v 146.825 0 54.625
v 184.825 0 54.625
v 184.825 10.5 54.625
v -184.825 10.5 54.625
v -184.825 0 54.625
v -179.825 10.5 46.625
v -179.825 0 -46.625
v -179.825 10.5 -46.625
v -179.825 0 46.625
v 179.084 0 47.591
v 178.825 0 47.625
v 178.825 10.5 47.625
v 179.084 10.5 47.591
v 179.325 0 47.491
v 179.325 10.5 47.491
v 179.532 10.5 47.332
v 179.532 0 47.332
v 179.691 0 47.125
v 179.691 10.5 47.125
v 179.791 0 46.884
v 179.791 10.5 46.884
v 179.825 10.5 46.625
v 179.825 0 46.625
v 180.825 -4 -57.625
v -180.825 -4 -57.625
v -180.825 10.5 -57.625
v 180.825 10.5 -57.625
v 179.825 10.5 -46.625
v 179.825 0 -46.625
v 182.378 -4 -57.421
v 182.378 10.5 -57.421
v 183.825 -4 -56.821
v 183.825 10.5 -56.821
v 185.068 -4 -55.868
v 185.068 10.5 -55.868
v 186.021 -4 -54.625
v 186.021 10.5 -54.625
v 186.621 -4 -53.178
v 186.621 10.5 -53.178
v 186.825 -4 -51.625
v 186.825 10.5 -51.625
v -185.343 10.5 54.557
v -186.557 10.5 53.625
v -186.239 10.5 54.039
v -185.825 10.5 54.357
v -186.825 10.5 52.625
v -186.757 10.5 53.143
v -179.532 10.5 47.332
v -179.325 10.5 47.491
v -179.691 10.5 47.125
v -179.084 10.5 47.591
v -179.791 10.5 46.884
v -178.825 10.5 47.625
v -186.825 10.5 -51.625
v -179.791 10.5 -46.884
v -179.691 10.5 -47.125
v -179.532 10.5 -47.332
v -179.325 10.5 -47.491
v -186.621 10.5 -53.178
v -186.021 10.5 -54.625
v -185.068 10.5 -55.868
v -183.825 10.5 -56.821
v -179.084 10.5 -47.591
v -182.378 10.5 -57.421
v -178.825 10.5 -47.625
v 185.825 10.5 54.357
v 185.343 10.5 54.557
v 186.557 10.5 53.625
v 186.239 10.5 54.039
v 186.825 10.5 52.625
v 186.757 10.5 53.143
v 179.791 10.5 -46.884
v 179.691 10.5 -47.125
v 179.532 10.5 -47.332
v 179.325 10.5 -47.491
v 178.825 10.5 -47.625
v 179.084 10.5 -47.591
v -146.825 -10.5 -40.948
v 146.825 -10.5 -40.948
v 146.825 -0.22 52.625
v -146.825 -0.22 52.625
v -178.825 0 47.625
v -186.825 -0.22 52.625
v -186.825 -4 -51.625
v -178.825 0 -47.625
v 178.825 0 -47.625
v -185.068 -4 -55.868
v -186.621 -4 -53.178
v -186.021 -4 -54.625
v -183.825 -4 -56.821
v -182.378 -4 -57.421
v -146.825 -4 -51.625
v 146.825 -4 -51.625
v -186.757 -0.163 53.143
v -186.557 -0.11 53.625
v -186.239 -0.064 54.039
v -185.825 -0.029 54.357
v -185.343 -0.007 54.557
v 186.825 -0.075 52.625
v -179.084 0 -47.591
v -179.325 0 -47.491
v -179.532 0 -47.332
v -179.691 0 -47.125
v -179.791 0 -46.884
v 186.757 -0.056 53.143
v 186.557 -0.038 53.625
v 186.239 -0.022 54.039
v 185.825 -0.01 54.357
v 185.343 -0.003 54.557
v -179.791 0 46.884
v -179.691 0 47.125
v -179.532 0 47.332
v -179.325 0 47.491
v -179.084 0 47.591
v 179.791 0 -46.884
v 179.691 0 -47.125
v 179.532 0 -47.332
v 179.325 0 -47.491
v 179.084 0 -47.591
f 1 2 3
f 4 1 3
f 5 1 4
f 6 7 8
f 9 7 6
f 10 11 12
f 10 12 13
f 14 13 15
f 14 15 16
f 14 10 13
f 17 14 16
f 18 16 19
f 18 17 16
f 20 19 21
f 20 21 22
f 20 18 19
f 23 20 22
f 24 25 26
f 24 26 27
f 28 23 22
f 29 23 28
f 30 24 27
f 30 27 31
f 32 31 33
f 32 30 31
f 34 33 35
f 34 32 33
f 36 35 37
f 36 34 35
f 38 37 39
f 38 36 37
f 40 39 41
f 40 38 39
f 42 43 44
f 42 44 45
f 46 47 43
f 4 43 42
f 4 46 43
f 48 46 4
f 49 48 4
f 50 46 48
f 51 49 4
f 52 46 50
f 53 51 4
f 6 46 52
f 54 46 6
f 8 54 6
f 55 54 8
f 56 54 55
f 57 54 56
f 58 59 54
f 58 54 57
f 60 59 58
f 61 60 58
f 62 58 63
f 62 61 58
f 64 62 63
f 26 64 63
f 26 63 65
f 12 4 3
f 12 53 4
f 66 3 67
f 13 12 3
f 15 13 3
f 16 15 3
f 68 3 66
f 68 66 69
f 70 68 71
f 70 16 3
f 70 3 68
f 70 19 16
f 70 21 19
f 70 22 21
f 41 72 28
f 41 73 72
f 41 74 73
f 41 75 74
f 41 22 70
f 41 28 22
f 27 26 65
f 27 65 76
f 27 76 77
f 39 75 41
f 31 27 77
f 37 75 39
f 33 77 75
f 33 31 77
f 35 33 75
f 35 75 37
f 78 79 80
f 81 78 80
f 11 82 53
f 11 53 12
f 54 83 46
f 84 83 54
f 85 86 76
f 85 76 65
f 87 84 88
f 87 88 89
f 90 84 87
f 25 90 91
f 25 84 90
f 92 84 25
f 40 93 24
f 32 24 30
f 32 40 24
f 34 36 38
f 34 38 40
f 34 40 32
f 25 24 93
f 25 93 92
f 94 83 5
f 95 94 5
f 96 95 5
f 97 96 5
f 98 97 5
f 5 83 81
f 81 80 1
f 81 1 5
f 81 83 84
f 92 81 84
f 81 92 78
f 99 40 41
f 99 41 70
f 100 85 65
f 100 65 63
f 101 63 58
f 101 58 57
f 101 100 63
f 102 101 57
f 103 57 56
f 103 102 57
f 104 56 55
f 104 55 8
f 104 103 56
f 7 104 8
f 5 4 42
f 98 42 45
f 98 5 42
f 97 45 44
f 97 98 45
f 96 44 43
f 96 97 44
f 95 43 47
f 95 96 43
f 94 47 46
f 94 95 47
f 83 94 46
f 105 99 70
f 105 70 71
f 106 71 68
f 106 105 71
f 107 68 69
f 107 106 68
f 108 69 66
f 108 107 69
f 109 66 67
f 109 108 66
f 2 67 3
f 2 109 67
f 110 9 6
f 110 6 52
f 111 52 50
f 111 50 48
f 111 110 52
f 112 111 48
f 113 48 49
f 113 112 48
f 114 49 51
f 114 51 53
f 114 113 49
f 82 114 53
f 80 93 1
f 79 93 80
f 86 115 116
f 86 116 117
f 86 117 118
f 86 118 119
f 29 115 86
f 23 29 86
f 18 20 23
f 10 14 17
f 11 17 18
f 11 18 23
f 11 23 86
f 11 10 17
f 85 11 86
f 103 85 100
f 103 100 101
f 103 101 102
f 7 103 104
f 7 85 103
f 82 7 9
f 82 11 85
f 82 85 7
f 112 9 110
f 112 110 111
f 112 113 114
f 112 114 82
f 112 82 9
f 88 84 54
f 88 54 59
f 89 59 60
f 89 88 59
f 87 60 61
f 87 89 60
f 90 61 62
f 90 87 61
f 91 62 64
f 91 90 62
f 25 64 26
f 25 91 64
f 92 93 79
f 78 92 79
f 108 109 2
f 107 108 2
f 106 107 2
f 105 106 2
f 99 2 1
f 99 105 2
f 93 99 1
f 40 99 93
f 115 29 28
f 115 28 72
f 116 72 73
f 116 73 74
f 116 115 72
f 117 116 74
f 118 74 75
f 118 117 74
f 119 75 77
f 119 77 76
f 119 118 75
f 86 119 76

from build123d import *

# Parameters (mm, degrees)
BOSS_EXTRUDE1_DEPTH = 10.5
BOSS_EXTRUDE3_START = 10.5
BOSS_EXTRUDE3_DEPTH = 10.5
SKETCH5_W           = 6
SKETCH5_H           = 6.5
CUT_EXTRUDE1_DEPTH  = 400
CUT_EXTRUDE2_DEPTH  = 40
CUT_EXTRUDE3_DEPTH  = 40


with BuildPart() as part:
    # Sketch2 → Boss-Extrude1 (new body)
    with BuildSketch(Plane(origin=(0, 0, 0), x_dir=(1, 0, 0), z_dir=(0, 1, 0))):
        with BuildLine():
            Line((-186.825, 51.625), (-186.825, -52.625))
            ThreePointArc((-186.825, -52.625), (-186.239213562, -54.039213562), (-184.825, -54.625))
            Line((-184.825, -54.625), (184.825, -54.625))
            ThreePointArc((184.825, -54.625), (186.239213562, -54.039213562), (186.825, -52.625))
            Line((186.825, -52.625), (186.825, 51.625))
            ThreePointArc((186.825, 51.625), (185.067640687, 55.867640687), (180.825, 57.625))
            Line((180.825, 57.625), (-180.825, 57.625))
            ThreePointArc((-180.825, 57.625), (-185.067640687, 55.867640687), (-186.825, 51.625))
        make_face()
        with BuildLine():
            ThreePointArc((-178.825, 47.625), (-179.532106781, 47.332106781), (-179.825, 46.625))
            Line((-179.825, 46.625), (-179.825, -46.625))
            ThreePointArc((-179.825, -46.625), (-179.532106781, -47.332106781), (-178.825, -47.625))
            Line((-178.825, -47.625), (178.825, -47.625))
            ThreePointArc((178.825, -47.625), (179.532106781, -47.332106781), (179.825, -46.625))
            Line((179.825, -46.625), (179.825, 46.625))
            ThreePointArc((179.825, 46.625), (179.532106781, 47.332106781), (178.825, 47.625))
            Line((178.825, 47.625), (-178.825, 47.625))
        make_face(mode=Mode.SUBTRACT)
    extrude(amount=BOSS_EXTRUDE1_DEPTH)

    # Sketch4 → Boss-Extrude3 (add)
    # profile 1 of 2: a face of its own
    with BuildSketch(Plane.XZ.offset(BOSS_EXTRUDE3_START)):
        with BuildLine():
            ThreePointArc((-184.825, 54.625), (-186.239213562, 54.039213562), (-186.825, 52.625))
            Line((-186.825, 52.625), (-186.825, -51.625))
            ThreePointArc((-186.825, -51.625), (-185.067640687, -55.867640687), (-180.825, -57.625))
            Line((-180.825, -57.625), (180.825, -57.625))
            ThreePointArc((180.825, -57.625), (185.067640687, -55.867640687), (186.825, -51.625))
            Line((186.825, -51.625), (186.825, 52.625))
            ThreePointArc((186.825, 52.625), (186.239213562, 54.039213562), (184.825, 54.625))
            Line((184.825, 54.625), (-184.825, 54.625))
        make_face()
        with BuildLine():
            Line((178.825, -47.625), (-178.825, -47.625))
            ThreePointArc((-178.825, -47.625), (-179.532106781, -47.332106781), (-179.825, -46.625))
            Line((-179.825, -46.625), (-179.825, 46.625))
            ThreePointArc((-179.825, 46.625), (-179.532106781, 47.332106781), (-178.825, 47.625))
            Line((-178.825, 47.625), (178.825, 47.625))
            ThreePointArc((178.825, 47.625), (179.532106781, 47.332106781), (179.825, 46.625))
            Line((179.825, 46.625), (179.825, -46.625))
            ThreePointArc((179.825, -46.625), (179.532106781, -47.332106781), (178.825, -47.625))
        make_face(mode=Mode.SUBTRACT)
    # profile 2 of 2: a face of its own
    with BuildSketch(Plane.XZ.offset(BOSS_EXTRUDE3_START)):
        with BuildLine():
            ThreePointArc((-178.825, -47.625), (-179.532106781, -47.332106781), (-179.825, -46.625))
            Line((-179.825, -46.625), (-179.825, 46.625))
            ThreePointArc((-179.825, 46.625), (-179.532106781, 47.332106781), (-178.825, 47.625))
            Line((-178.825, 47.625), (178.825, 47.625))
            ThreePointArc((178.825, 47.625), (179.532106781, 47.332106781), (179.825, 46.625))
            Line((179.825, 46.625), (179.825, -46.625))
            ThreePointArc((179.825, -46.625), (179.532106781, -47.332106781), (178.825, -47.625))
            Line((178.825, -47.625), (-178.825, -47.625))
        make_face()
    extrude(amount=-BOSS_EXTRUDE3_DEPTH)

    # Sketch5 → Cut-Extrude1 (cut)
    with BuildSketch(Plane(origin=(186.825, 0, 0), x_dir=(0, 0, -1), z_dir=(1, 0, 0))):
        Polygon((-52.625, -10.5), (-52.625, -0.219727509), (-54.625, 0), (-54.625, -10.5), align=None)
        Polygon((-52.625, -10.5), (40.947921748, -10.5), (-52.625, -0.219727509), align=None)
        Polygon((51.625, -10.5), (51.625, -4), (40.947921748, -10.5), align=None)
        with Locations((54.625, -7.25)):
            Rectangle(SKETCH5_W, SKETCH5_H)
    extrude(amount=-CUT_EXTRUDE1_DEPTH, mode=Mode.SUBTRACT)

    # Sketch6 → Cut-Extrude2 (cut)
    with BuildSketch(Plane(origin=(186.825, 0, 0), x_dir=(0, 0, -1), z_dir=(1, 0, 0))):
        Polygon((-54.625, 0), (51.625, -4), (40.947921748, -10.5), align=None)
    extrude(amount=-CUT_EXTRUDE2_DEPTH, mode=Mode.SUBTRACT)

    # Sketch7 → Cut-Extrude3 (cut)
    with BuildSketch(Plane.ZY.offset(186.825)):
        Polygon((-51.625, -4), (-40.947921748, -10.5), (52.625, -0.219727509), align=None)
    extrude(amount=-CUT_EXTRUDE3_DEPTH, mode=Mode.SUBTRACT)


solid = part.part
